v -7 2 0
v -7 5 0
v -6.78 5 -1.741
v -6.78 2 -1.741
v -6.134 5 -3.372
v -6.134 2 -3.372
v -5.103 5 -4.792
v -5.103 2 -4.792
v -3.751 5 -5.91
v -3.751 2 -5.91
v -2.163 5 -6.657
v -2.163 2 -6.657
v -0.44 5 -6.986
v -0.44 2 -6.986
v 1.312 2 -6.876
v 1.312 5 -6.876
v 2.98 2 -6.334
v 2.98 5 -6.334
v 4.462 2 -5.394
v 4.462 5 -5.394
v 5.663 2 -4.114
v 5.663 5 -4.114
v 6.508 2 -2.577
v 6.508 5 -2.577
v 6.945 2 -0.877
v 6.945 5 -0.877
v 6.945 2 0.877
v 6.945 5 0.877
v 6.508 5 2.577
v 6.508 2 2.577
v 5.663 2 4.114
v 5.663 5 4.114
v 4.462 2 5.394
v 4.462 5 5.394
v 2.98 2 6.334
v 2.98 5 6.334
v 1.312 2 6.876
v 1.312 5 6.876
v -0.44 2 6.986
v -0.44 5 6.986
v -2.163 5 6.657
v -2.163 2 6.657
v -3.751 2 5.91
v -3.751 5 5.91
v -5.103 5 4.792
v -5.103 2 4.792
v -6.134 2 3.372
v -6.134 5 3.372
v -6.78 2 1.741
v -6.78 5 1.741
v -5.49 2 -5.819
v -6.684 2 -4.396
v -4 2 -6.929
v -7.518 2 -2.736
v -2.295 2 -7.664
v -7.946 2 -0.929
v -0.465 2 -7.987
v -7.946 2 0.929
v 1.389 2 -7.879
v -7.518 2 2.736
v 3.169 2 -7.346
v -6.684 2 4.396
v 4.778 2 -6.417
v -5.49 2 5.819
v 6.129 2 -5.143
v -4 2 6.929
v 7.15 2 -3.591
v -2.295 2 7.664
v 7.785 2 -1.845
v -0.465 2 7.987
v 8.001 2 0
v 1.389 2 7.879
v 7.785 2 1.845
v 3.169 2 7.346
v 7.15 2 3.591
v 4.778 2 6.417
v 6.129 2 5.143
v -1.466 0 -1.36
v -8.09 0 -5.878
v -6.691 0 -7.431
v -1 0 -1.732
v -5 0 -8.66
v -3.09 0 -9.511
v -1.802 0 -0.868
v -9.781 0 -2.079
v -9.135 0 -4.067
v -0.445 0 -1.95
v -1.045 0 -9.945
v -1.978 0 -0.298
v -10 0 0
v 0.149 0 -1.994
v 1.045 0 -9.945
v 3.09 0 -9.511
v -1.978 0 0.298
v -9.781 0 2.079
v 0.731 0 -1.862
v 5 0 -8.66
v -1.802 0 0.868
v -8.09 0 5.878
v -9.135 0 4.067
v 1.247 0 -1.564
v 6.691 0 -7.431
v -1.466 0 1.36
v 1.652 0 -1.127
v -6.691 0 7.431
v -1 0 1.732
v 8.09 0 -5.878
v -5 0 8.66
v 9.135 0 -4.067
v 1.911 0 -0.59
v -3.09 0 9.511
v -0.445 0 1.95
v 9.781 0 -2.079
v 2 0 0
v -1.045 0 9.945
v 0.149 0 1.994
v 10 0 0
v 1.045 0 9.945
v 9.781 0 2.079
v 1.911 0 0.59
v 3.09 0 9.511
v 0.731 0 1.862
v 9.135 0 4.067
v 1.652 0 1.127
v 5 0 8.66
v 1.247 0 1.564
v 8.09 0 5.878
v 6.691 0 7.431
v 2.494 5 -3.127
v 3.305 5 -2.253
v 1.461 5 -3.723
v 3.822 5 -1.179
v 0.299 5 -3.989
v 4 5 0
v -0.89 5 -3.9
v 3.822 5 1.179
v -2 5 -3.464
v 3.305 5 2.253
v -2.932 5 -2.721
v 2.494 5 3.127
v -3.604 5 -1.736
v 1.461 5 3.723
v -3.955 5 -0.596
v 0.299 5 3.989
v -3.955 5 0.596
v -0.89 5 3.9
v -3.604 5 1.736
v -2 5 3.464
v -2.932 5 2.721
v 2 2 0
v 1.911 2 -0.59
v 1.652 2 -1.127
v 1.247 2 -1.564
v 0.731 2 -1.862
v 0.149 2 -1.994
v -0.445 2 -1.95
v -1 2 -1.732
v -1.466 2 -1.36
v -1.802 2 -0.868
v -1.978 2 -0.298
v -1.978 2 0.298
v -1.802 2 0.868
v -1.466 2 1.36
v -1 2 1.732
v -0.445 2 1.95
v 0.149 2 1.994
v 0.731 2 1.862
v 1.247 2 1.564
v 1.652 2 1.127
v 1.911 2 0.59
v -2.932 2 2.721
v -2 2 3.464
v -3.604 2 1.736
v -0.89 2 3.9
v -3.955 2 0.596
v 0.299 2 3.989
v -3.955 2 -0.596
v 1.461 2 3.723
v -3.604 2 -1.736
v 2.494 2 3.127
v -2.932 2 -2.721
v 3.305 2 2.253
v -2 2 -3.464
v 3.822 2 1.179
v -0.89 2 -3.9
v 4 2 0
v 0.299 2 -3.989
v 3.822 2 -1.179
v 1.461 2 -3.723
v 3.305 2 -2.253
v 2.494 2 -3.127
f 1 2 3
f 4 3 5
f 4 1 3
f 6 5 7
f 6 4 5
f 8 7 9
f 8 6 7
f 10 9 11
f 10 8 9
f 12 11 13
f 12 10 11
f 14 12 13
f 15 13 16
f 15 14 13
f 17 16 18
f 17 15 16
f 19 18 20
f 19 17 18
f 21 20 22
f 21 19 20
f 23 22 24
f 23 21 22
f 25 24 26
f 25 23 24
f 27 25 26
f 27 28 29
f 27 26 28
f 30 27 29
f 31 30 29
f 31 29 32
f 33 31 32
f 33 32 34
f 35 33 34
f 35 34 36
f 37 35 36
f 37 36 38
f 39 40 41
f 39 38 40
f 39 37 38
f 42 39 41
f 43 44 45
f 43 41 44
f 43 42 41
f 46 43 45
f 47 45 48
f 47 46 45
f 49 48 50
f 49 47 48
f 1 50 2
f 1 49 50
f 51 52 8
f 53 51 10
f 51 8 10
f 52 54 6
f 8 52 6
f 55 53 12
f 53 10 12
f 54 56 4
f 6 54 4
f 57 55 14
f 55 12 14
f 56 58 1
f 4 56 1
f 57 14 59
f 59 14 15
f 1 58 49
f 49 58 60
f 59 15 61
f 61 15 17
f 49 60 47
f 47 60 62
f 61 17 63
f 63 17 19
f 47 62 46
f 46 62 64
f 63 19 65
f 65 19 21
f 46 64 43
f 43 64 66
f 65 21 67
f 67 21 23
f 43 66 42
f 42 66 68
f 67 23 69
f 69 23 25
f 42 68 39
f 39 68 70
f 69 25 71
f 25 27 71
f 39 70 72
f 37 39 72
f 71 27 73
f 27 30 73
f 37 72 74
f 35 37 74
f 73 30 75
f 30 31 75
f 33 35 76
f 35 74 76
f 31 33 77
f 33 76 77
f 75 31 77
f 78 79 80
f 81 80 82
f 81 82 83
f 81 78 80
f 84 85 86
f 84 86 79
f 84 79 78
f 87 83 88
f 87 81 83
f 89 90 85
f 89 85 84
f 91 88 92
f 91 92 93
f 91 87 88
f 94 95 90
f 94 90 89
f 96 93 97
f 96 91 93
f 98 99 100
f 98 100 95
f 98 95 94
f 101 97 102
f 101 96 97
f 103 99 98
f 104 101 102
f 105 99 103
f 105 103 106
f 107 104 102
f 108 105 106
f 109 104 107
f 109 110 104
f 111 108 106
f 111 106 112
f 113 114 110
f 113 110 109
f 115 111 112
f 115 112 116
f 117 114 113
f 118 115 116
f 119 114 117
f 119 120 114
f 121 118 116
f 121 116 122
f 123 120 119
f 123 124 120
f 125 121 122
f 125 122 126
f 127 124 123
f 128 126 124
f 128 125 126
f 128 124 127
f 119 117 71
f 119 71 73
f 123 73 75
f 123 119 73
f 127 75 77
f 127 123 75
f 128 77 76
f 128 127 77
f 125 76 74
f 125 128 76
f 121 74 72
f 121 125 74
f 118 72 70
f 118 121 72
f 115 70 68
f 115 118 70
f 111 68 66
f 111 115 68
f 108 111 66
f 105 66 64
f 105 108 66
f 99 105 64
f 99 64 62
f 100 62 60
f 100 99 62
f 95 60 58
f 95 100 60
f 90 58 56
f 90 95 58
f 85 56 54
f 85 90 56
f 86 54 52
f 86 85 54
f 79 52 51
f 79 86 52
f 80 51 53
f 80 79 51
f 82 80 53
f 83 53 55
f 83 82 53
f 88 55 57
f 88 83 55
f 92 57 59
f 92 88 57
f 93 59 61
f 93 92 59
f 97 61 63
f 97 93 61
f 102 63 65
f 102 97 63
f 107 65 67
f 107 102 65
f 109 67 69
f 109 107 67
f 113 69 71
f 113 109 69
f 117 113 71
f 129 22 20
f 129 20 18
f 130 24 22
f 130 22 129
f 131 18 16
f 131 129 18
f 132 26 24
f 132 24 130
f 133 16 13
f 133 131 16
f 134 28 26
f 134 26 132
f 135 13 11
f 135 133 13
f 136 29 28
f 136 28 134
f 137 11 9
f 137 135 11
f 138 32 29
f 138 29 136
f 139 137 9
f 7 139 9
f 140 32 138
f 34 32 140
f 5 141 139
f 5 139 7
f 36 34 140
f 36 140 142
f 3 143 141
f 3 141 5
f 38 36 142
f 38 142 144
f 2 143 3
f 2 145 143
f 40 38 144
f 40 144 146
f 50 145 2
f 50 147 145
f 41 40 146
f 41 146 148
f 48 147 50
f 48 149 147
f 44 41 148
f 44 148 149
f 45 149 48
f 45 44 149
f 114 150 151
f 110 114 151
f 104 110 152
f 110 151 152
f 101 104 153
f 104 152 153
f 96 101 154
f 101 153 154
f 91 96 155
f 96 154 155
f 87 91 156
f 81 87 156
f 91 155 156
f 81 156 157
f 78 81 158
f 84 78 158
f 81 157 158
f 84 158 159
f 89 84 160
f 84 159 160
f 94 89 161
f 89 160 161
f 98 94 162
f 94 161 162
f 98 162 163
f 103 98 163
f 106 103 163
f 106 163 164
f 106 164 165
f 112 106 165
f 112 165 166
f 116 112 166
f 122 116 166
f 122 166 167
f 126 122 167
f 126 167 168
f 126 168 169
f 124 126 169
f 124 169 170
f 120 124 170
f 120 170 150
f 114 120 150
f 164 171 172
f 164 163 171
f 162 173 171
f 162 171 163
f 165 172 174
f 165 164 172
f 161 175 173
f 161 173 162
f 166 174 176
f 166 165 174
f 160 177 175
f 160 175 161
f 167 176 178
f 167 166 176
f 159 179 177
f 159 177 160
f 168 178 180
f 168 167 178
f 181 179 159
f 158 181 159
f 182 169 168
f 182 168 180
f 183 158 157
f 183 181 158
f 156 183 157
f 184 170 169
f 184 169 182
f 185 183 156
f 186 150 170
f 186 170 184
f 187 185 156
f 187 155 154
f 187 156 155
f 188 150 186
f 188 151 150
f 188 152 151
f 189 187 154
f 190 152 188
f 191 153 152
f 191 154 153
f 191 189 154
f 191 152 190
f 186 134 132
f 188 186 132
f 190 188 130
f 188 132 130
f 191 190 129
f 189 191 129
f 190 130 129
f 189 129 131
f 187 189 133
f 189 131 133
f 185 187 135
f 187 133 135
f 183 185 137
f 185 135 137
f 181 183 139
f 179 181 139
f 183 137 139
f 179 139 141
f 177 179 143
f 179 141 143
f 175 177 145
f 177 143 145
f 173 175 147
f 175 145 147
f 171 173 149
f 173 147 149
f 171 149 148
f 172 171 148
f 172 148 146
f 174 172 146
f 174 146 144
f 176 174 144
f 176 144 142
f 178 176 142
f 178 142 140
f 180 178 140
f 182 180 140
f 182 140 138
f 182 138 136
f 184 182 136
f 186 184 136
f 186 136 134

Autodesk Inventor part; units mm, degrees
ref_plane "YZ Plane" through (0, 0, 0) normal (1, 0, 0) x (0, 1, 0)
ref_plane "XZ Plane" through (0, 0, 0) normal (0, 1, 0) x (-1, 0, 0)
ref_plane "XY Plane" through (0, 0, 0) normal (0, 0, 1) x (1, 0, 0)
sketch "Sketch1" plane through (0, 0, 0) normal (0, 1, 0) x (-1, 0, 0)
  circle A0 centre (0, 0) radius 7
  dimension "d0" = 14
extrude "Extrusion1" add sketch "Sketch1" along normal blind 5
sketch "Sketch2" plane through (0, 5, 0) normal (0, 1, 0) x (1, 0, 0)
  circle A0 centre (0, 0) radius 4
  dimension "d3" = 8
extrude "Extrusion2" cut sketch "Sketch2" against normal blind 3
sketch "Sketch3" plane through (0, 2, 0) normal (0, 1, 0) x (1, 0, 0)
  circle A0 centre (0, 0) radius 2
  dimension "d6" = 4
extrude "Extrusion3" cut sketch "Sketch3" against normal through all
sketch "Sketch4" plane through (0, 0, 0) normal (0, -1, 0) x (1, 0, 0)
  circle A0 centre (0, 0) radius 10
  circle A1 centre (0, 0) radius 7
  dimension "d9" = 20
extrude "Extrusion4" add sketch "Sketch4" against normal blind 2
chamfer "Chamfer1" distance 2 angle 45 1 edges at (-10, 2, 0)
properties part number "spacer_short"
